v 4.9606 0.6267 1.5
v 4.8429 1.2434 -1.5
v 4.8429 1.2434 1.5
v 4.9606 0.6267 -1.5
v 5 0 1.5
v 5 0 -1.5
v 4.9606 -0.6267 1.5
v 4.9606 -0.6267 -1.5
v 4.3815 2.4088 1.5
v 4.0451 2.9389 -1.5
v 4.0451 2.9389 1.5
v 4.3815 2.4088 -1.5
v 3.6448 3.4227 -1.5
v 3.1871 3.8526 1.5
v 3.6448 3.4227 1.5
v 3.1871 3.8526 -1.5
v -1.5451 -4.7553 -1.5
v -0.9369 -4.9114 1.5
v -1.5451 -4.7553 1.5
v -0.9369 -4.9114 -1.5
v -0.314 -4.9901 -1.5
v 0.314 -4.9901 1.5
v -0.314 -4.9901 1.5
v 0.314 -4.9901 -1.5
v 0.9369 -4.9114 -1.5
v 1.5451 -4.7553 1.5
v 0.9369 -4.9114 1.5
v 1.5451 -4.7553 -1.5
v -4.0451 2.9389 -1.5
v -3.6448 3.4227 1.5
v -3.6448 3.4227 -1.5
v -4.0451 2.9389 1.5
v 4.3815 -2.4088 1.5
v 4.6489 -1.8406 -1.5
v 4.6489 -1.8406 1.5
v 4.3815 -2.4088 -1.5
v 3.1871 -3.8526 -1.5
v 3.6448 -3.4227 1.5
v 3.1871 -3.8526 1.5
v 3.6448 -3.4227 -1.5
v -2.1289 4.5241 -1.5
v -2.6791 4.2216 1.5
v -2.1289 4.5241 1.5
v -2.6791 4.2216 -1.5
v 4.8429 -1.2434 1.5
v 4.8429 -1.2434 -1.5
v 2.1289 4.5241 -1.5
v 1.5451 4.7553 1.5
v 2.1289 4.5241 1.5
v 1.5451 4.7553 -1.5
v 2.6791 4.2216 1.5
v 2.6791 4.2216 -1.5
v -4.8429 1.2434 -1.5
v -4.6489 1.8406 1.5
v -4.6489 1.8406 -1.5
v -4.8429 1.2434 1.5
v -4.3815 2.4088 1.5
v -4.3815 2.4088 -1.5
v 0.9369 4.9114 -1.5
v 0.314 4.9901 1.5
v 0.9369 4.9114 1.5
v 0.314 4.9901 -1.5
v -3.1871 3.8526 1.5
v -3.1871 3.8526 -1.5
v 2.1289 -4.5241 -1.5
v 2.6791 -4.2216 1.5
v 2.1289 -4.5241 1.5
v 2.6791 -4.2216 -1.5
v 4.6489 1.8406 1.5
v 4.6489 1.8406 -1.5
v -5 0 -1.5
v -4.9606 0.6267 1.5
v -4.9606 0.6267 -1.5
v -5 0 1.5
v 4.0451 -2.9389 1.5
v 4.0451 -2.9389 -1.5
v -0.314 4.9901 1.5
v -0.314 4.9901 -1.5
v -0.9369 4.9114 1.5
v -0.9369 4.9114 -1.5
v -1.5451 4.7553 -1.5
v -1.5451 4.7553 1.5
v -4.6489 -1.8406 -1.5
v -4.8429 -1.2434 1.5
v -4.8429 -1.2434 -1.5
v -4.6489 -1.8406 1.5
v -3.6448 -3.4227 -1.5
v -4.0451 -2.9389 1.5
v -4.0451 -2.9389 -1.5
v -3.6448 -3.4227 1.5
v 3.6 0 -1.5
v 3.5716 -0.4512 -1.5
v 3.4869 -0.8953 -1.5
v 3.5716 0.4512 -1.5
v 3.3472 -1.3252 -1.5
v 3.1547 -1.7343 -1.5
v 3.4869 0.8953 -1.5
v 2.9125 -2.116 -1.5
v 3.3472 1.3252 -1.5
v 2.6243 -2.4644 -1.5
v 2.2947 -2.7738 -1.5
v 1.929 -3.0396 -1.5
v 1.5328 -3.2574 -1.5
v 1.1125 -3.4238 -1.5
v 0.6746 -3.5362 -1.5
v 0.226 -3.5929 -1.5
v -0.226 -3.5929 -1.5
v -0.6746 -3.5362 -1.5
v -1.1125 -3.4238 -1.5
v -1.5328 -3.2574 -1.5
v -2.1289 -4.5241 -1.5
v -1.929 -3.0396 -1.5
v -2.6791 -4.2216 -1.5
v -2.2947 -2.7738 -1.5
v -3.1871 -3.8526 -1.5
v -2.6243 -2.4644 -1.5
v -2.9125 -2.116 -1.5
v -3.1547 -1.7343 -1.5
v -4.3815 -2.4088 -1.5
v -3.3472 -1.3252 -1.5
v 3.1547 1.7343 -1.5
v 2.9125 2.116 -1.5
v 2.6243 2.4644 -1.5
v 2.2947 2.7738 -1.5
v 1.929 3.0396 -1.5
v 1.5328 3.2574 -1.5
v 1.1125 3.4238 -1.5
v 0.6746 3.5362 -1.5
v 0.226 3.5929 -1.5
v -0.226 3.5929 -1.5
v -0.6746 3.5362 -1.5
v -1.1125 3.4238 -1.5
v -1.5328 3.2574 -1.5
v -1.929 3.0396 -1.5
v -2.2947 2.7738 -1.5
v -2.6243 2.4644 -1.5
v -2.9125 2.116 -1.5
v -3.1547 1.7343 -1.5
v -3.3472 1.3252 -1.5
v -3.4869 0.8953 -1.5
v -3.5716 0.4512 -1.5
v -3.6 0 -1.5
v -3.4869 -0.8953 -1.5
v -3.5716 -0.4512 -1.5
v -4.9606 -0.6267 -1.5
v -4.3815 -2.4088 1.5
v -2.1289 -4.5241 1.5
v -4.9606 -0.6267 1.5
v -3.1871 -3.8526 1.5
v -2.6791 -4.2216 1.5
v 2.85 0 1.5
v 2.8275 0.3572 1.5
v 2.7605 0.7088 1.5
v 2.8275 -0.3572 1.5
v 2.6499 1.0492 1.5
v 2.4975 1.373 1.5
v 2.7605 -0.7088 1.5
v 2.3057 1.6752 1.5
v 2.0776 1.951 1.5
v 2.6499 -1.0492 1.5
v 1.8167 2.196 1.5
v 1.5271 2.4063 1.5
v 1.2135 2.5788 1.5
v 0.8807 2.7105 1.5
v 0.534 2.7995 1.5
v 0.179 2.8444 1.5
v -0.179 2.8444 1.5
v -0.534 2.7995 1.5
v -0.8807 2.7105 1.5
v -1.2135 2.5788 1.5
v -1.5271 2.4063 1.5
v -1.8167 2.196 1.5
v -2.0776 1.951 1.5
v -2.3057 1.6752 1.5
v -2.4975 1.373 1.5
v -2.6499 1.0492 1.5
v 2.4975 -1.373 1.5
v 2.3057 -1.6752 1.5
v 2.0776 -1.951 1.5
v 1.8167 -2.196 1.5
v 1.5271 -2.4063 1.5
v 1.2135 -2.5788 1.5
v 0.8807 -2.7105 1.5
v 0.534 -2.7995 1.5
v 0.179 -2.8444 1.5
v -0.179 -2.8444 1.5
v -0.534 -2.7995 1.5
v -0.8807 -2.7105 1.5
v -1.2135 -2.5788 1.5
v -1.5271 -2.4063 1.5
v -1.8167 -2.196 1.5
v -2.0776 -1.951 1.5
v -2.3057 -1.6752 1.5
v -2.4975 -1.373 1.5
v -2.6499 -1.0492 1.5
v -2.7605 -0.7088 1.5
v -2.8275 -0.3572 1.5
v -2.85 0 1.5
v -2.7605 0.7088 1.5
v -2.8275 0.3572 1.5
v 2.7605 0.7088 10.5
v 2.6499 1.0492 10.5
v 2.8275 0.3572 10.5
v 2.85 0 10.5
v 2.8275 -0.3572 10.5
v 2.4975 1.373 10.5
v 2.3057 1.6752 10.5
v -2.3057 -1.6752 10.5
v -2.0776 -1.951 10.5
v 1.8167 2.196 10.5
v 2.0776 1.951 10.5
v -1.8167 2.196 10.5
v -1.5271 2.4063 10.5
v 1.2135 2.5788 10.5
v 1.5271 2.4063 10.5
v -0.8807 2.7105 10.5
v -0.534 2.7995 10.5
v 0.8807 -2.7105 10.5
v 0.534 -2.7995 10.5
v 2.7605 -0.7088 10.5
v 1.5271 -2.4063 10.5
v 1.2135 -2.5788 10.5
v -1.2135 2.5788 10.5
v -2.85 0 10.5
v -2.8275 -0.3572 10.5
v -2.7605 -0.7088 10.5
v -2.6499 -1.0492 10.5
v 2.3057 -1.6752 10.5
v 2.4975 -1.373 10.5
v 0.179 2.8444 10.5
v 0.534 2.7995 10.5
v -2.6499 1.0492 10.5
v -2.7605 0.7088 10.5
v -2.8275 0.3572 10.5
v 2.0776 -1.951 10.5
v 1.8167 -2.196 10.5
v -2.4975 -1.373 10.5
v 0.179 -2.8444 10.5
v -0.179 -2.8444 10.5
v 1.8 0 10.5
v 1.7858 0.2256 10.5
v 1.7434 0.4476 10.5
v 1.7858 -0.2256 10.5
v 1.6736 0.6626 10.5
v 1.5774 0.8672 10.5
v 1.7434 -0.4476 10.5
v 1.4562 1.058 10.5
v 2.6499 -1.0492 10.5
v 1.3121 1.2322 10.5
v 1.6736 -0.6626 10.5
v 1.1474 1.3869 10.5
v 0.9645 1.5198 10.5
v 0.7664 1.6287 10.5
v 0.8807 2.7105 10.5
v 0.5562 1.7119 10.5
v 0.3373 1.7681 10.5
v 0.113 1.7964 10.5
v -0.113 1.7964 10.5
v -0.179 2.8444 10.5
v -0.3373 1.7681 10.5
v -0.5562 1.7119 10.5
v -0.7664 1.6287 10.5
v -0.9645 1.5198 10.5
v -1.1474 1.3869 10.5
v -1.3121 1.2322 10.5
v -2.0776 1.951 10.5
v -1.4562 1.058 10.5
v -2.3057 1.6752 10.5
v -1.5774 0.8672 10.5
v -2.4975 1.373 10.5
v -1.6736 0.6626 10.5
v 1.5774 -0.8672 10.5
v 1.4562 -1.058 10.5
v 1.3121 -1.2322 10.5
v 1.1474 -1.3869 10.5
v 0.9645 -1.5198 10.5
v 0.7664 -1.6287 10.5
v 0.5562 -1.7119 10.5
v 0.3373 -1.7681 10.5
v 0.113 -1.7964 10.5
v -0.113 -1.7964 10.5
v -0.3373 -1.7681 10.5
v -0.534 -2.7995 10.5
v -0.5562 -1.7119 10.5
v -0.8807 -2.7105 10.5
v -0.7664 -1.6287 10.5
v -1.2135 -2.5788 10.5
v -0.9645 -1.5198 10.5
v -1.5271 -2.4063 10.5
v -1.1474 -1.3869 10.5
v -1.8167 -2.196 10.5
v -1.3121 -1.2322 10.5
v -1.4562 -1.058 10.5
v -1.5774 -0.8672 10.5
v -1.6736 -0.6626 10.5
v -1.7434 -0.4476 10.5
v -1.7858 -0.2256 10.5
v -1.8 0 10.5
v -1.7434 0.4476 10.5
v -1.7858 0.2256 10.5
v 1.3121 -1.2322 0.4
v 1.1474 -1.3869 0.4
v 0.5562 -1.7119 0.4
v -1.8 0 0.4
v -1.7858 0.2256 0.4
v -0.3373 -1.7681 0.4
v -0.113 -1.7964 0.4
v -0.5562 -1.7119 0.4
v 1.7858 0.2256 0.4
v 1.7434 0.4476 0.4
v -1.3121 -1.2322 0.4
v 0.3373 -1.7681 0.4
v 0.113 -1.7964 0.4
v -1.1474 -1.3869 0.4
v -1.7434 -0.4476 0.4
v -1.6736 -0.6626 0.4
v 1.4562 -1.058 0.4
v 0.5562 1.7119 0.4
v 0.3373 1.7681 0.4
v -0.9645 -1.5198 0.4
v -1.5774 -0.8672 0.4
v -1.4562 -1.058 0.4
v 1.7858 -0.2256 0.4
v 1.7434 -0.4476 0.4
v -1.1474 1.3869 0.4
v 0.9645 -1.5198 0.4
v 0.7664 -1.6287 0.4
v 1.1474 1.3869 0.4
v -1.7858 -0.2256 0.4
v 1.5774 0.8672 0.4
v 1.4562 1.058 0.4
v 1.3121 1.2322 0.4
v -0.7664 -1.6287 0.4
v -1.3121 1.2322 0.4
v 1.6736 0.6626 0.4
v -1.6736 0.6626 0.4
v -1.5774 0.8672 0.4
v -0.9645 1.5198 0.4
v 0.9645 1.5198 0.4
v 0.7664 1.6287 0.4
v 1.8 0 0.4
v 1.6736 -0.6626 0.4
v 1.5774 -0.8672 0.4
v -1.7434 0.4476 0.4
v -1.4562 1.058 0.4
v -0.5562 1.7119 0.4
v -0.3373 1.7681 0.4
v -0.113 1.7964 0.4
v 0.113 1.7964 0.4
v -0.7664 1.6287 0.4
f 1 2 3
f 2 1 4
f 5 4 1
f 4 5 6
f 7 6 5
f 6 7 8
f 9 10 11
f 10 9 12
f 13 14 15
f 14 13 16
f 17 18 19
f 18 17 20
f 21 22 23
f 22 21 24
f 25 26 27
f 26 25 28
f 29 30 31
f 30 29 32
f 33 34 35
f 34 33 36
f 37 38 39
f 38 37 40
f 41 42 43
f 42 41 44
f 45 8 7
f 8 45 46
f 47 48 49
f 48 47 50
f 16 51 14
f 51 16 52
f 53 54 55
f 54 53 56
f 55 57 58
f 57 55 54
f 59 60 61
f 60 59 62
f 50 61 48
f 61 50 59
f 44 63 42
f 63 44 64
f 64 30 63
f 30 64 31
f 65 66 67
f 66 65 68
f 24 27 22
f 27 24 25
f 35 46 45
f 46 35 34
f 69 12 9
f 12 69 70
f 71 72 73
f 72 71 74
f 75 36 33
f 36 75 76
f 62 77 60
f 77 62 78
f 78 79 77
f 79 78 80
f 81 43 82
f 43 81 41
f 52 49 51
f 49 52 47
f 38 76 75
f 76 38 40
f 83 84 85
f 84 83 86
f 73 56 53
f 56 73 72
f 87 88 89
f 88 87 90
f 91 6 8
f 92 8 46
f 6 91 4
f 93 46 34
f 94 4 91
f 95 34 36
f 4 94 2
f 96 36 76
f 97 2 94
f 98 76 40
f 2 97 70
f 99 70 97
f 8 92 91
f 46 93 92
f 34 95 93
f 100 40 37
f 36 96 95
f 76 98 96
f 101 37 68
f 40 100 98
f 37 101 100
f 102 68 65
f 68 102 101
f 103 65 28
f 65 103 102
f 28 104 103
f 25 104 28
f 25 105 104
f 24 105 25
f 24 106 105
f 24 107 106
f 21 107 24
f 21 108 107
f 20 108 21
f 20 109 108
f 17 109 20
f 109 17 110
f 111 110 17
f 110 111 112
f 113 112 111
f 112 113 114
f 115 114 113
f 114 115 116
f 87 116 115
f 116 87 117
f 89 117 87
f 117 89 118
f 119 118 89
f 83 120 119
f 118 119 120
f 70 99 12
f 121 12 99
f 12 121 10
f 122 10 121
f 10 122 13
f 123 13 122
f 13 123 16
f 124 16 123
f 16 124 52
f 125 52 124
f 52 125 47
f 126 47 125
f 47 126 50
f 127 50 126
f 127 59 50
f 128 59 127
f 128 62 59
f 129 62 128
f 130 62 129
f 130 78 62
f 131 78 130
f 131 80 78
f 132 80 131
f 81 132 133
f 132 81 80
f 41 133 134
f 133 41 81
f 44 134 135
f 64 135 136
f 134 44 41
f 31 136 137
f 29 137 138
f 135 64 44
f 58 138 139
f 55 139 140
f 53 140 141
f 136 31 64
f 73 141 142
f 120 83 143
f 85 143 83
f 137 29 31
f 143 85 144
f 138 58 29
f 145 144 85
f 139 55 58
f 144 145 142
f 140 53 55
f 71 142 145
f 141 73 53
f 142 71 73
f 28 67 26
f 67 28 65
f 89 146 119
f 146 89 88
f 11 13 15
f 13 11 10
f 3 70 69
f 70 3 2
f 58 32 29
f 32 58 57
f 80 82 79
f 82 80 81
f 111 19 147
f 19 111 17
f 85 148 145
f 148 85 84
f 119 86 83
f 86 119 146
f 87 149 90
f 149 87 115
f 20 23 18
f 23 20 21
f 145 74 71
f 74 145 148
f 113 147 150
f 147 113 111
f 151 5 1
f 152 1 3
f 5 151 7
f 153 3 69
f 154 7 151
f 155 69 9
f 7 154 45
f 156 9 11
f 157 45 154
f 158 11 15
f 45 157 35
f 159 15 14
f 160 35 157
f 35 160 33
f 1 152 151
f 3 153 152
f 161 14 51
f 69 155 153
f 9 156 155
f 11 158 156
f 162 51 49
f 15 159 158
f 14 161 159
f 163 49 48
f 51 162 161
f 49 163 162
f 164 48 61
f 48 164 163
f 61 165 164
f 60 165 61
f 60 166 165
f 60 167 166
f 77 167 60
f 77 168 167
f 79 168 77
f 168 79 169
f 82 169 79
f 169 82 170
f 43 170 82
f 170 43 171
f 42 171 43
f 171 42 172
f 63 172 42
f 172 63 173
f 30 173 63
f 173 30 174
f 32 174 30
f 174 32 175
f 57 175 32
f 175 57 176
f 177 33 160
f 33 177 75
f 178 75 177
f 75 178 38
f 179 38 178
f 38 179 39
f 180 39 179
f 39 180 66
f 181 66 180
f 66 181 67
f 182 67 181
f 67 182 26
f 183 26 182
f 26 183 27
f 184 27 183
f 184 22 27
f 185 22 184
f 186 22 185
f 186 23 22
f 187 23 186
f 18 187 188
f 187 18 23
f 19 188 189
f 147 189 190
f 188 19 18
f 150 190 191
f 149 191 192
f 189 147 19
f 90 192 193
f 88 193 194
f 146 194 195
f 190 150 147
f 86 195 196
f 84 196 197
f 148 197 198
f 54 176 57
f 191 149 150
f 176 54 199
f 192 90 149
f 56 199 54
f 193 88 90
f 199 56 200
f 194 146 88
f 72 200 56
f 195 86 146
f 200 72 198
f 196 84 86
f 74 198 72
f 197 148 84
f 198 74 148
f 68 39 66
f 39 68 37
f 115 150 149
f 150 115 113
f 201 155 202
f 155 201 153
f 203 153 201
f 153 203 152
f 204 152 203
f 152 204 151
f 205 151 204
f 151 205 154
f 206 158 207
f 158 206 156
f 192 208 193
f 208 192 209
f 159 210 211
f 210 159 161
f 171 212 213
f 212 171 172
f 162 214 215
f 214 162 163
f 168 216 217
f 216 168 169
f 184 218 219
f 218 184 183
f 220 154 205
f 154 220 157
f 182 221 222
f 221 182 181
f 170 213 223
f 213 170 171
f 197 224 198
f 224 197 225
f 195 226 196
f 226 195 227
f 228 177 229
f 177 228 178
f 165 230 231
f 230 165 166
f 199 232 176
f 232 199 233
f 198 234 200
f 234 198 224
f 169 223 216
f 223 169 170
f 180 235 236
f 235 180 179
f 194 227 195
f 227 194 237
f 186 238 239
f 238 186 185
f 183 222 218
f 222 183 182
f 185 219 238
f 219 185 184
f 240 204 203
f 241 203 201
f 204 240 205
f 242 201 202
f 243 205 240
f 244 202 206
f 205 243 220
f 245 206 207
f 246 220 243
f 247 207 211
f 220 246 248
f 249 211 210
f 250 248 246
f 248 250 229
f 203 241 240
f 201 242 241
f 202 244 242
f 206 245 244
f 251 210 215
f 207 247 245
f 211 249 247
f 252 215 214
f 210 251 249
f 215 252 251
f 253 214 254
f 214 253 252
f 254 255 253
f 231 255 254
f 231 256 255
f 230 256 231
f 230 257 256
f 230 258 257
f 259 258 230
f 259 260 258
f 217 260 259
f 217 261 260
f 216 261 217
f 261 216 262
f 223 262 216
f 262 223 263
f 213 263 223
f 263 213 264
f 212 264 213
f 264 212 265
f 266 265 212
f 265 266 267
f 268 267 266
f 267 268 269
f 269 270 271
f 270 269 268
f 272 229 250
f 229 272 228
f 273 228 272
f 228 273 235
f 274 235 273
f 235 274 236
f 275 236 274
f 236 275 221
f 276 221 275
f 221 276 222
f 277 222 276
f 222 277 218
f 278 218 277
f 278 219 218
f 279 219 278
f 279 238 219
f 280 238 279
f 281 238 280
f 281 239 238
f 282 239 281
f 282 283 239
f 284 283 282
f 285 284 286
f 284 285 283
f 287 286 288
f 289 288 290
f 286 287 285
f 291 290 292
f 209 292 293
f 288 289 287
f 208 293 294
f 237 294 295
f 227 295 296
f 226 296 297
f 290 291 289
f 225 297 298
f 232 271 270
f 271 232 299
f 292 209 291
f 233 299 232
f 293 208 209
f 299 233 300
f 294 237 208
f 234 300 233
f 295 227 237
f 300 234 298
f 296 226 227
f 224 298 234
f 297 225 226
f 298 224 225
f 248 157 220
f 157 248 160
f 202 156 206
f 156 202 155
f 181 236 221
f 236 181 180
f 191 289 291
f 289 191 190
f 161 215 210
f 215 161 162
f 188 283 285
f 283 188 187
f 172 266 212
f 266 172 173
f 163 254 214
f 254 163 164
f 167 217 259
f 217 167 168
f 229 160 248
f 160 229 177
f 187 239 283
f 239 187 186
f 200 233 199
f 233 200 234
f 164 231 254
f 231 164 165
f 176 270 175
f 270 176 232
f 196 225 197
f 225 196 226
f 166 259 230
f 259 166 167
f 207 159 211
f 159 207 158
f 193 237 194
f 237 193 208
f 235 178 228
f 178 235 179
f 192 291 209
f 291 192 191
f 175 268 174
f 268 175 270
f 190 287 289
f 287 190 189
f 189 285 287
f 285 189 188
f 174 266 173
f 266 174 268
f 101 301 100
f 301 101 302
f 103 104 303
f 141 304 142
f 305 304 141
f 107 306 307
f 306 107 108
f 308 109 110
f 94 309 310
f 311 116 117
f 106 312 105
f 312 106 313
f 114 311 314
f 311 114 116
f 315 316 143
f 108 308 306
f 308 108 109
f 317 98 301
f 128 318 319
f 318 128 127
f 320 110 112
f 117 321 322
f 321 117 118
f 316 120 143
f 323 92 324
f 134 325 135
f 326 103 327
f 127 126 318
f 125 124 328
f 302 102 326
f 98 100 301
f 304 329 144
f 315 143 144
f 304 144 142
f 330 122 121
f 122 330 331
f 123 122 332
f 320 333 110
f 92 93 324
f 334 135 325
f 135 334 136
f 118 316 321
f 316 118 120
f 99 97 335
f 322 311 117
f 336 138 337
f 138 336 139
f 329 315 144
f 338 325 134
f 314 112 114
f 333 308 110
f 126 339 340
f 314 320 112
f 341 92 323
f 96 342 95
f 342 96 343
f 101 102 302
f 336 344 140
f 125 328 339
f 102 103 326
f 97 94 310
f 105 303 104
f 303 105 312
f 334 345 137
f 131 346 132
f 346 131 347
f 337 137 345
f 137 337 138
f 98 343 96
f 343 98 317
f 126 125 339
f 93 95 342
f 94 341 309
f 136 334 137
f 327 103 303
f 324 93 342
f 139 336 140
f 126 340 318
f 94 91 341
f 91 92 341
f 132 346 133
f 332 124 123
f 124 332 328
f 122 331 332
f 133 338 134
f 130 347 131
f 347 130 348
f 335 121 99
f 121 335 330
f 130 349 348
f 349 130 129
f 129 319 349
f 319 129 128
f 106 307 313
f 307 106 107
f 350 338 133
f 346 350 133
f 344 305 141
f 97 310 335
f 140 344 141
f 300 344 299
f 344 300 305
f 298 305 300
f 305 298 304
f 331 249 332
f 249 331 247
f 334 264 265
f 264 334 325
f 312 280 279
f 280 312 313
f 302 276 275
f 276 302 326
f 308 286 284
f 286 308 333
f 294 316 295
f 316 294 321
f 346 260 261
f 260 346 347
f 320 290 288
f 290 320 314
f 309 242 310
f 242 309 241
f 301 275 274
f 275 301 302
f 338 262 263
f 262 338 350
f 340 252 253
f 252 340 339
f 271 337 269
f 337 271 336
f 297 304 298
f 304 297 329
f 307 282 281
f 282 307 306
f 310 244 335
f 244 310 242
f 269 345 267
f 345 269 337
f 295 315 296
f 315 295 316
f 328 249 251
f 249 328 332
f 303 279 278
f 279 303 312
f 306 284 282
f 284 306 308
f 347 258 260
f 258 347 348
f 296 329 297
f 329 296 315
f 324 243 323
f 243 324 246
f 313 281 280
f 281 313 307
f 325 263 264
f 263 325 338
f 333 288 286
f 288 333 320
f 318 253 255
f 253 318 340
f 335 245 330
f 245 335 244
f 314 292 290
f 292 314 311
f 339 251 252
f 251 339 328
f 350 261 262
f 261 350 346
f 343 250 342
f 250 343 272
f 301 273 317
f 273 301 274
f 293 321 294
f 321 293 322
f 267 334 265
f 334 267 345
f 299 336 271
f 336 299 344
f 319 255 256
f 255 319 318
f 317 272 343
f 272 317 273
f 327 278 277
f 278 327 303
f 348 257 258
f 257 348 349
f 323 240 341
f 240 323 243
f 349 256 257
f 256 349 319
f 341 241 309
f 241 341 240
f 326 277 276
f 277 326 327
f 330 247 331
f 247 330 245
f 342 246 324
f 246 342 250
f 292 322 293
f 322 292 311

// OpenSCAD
$fn = 50;


difference() {
	union() {
		translate(v = [0, 0, -1.5000000000]) {
			cylinder(h = 3, r = 5.0000000000);
		}
		translate(v = [0, 0, -1.5000000000]) {
			cylinder(h = 12, r = 2.8500000000);
		}
	}
	union() {
		translate(v = [0, 0, -1.5000000000]) {
			rotate(a = [0, 180, 0]) {
				difference() {
					union() {
						translate(v = [0, 0, -12.0000000000]) {
							cylinder(h = 12, r = 1.5000000000);
						}
						translate(v = [0, 0, -1.9000000000]) {
							cylinder(h = 1.9000000000, r1 = 1.8000000000, r2 = 3.6000000000);
						}
						translate(v = [0, 0, -12.0000000000]) {
							cylinder(h = 12, r = 1.8000000000);
						}
						translate(v = [0, 0, -12.0000000000]) {
							cylinder(h = 12, r = 1.5000000000);
						}
					}
					union();
				}
			}
		}
		translate(v = [0, 0, -50.0000000000]) {
			cylinder(h = 100, r = 1.8000000000);
		}
	}
}
